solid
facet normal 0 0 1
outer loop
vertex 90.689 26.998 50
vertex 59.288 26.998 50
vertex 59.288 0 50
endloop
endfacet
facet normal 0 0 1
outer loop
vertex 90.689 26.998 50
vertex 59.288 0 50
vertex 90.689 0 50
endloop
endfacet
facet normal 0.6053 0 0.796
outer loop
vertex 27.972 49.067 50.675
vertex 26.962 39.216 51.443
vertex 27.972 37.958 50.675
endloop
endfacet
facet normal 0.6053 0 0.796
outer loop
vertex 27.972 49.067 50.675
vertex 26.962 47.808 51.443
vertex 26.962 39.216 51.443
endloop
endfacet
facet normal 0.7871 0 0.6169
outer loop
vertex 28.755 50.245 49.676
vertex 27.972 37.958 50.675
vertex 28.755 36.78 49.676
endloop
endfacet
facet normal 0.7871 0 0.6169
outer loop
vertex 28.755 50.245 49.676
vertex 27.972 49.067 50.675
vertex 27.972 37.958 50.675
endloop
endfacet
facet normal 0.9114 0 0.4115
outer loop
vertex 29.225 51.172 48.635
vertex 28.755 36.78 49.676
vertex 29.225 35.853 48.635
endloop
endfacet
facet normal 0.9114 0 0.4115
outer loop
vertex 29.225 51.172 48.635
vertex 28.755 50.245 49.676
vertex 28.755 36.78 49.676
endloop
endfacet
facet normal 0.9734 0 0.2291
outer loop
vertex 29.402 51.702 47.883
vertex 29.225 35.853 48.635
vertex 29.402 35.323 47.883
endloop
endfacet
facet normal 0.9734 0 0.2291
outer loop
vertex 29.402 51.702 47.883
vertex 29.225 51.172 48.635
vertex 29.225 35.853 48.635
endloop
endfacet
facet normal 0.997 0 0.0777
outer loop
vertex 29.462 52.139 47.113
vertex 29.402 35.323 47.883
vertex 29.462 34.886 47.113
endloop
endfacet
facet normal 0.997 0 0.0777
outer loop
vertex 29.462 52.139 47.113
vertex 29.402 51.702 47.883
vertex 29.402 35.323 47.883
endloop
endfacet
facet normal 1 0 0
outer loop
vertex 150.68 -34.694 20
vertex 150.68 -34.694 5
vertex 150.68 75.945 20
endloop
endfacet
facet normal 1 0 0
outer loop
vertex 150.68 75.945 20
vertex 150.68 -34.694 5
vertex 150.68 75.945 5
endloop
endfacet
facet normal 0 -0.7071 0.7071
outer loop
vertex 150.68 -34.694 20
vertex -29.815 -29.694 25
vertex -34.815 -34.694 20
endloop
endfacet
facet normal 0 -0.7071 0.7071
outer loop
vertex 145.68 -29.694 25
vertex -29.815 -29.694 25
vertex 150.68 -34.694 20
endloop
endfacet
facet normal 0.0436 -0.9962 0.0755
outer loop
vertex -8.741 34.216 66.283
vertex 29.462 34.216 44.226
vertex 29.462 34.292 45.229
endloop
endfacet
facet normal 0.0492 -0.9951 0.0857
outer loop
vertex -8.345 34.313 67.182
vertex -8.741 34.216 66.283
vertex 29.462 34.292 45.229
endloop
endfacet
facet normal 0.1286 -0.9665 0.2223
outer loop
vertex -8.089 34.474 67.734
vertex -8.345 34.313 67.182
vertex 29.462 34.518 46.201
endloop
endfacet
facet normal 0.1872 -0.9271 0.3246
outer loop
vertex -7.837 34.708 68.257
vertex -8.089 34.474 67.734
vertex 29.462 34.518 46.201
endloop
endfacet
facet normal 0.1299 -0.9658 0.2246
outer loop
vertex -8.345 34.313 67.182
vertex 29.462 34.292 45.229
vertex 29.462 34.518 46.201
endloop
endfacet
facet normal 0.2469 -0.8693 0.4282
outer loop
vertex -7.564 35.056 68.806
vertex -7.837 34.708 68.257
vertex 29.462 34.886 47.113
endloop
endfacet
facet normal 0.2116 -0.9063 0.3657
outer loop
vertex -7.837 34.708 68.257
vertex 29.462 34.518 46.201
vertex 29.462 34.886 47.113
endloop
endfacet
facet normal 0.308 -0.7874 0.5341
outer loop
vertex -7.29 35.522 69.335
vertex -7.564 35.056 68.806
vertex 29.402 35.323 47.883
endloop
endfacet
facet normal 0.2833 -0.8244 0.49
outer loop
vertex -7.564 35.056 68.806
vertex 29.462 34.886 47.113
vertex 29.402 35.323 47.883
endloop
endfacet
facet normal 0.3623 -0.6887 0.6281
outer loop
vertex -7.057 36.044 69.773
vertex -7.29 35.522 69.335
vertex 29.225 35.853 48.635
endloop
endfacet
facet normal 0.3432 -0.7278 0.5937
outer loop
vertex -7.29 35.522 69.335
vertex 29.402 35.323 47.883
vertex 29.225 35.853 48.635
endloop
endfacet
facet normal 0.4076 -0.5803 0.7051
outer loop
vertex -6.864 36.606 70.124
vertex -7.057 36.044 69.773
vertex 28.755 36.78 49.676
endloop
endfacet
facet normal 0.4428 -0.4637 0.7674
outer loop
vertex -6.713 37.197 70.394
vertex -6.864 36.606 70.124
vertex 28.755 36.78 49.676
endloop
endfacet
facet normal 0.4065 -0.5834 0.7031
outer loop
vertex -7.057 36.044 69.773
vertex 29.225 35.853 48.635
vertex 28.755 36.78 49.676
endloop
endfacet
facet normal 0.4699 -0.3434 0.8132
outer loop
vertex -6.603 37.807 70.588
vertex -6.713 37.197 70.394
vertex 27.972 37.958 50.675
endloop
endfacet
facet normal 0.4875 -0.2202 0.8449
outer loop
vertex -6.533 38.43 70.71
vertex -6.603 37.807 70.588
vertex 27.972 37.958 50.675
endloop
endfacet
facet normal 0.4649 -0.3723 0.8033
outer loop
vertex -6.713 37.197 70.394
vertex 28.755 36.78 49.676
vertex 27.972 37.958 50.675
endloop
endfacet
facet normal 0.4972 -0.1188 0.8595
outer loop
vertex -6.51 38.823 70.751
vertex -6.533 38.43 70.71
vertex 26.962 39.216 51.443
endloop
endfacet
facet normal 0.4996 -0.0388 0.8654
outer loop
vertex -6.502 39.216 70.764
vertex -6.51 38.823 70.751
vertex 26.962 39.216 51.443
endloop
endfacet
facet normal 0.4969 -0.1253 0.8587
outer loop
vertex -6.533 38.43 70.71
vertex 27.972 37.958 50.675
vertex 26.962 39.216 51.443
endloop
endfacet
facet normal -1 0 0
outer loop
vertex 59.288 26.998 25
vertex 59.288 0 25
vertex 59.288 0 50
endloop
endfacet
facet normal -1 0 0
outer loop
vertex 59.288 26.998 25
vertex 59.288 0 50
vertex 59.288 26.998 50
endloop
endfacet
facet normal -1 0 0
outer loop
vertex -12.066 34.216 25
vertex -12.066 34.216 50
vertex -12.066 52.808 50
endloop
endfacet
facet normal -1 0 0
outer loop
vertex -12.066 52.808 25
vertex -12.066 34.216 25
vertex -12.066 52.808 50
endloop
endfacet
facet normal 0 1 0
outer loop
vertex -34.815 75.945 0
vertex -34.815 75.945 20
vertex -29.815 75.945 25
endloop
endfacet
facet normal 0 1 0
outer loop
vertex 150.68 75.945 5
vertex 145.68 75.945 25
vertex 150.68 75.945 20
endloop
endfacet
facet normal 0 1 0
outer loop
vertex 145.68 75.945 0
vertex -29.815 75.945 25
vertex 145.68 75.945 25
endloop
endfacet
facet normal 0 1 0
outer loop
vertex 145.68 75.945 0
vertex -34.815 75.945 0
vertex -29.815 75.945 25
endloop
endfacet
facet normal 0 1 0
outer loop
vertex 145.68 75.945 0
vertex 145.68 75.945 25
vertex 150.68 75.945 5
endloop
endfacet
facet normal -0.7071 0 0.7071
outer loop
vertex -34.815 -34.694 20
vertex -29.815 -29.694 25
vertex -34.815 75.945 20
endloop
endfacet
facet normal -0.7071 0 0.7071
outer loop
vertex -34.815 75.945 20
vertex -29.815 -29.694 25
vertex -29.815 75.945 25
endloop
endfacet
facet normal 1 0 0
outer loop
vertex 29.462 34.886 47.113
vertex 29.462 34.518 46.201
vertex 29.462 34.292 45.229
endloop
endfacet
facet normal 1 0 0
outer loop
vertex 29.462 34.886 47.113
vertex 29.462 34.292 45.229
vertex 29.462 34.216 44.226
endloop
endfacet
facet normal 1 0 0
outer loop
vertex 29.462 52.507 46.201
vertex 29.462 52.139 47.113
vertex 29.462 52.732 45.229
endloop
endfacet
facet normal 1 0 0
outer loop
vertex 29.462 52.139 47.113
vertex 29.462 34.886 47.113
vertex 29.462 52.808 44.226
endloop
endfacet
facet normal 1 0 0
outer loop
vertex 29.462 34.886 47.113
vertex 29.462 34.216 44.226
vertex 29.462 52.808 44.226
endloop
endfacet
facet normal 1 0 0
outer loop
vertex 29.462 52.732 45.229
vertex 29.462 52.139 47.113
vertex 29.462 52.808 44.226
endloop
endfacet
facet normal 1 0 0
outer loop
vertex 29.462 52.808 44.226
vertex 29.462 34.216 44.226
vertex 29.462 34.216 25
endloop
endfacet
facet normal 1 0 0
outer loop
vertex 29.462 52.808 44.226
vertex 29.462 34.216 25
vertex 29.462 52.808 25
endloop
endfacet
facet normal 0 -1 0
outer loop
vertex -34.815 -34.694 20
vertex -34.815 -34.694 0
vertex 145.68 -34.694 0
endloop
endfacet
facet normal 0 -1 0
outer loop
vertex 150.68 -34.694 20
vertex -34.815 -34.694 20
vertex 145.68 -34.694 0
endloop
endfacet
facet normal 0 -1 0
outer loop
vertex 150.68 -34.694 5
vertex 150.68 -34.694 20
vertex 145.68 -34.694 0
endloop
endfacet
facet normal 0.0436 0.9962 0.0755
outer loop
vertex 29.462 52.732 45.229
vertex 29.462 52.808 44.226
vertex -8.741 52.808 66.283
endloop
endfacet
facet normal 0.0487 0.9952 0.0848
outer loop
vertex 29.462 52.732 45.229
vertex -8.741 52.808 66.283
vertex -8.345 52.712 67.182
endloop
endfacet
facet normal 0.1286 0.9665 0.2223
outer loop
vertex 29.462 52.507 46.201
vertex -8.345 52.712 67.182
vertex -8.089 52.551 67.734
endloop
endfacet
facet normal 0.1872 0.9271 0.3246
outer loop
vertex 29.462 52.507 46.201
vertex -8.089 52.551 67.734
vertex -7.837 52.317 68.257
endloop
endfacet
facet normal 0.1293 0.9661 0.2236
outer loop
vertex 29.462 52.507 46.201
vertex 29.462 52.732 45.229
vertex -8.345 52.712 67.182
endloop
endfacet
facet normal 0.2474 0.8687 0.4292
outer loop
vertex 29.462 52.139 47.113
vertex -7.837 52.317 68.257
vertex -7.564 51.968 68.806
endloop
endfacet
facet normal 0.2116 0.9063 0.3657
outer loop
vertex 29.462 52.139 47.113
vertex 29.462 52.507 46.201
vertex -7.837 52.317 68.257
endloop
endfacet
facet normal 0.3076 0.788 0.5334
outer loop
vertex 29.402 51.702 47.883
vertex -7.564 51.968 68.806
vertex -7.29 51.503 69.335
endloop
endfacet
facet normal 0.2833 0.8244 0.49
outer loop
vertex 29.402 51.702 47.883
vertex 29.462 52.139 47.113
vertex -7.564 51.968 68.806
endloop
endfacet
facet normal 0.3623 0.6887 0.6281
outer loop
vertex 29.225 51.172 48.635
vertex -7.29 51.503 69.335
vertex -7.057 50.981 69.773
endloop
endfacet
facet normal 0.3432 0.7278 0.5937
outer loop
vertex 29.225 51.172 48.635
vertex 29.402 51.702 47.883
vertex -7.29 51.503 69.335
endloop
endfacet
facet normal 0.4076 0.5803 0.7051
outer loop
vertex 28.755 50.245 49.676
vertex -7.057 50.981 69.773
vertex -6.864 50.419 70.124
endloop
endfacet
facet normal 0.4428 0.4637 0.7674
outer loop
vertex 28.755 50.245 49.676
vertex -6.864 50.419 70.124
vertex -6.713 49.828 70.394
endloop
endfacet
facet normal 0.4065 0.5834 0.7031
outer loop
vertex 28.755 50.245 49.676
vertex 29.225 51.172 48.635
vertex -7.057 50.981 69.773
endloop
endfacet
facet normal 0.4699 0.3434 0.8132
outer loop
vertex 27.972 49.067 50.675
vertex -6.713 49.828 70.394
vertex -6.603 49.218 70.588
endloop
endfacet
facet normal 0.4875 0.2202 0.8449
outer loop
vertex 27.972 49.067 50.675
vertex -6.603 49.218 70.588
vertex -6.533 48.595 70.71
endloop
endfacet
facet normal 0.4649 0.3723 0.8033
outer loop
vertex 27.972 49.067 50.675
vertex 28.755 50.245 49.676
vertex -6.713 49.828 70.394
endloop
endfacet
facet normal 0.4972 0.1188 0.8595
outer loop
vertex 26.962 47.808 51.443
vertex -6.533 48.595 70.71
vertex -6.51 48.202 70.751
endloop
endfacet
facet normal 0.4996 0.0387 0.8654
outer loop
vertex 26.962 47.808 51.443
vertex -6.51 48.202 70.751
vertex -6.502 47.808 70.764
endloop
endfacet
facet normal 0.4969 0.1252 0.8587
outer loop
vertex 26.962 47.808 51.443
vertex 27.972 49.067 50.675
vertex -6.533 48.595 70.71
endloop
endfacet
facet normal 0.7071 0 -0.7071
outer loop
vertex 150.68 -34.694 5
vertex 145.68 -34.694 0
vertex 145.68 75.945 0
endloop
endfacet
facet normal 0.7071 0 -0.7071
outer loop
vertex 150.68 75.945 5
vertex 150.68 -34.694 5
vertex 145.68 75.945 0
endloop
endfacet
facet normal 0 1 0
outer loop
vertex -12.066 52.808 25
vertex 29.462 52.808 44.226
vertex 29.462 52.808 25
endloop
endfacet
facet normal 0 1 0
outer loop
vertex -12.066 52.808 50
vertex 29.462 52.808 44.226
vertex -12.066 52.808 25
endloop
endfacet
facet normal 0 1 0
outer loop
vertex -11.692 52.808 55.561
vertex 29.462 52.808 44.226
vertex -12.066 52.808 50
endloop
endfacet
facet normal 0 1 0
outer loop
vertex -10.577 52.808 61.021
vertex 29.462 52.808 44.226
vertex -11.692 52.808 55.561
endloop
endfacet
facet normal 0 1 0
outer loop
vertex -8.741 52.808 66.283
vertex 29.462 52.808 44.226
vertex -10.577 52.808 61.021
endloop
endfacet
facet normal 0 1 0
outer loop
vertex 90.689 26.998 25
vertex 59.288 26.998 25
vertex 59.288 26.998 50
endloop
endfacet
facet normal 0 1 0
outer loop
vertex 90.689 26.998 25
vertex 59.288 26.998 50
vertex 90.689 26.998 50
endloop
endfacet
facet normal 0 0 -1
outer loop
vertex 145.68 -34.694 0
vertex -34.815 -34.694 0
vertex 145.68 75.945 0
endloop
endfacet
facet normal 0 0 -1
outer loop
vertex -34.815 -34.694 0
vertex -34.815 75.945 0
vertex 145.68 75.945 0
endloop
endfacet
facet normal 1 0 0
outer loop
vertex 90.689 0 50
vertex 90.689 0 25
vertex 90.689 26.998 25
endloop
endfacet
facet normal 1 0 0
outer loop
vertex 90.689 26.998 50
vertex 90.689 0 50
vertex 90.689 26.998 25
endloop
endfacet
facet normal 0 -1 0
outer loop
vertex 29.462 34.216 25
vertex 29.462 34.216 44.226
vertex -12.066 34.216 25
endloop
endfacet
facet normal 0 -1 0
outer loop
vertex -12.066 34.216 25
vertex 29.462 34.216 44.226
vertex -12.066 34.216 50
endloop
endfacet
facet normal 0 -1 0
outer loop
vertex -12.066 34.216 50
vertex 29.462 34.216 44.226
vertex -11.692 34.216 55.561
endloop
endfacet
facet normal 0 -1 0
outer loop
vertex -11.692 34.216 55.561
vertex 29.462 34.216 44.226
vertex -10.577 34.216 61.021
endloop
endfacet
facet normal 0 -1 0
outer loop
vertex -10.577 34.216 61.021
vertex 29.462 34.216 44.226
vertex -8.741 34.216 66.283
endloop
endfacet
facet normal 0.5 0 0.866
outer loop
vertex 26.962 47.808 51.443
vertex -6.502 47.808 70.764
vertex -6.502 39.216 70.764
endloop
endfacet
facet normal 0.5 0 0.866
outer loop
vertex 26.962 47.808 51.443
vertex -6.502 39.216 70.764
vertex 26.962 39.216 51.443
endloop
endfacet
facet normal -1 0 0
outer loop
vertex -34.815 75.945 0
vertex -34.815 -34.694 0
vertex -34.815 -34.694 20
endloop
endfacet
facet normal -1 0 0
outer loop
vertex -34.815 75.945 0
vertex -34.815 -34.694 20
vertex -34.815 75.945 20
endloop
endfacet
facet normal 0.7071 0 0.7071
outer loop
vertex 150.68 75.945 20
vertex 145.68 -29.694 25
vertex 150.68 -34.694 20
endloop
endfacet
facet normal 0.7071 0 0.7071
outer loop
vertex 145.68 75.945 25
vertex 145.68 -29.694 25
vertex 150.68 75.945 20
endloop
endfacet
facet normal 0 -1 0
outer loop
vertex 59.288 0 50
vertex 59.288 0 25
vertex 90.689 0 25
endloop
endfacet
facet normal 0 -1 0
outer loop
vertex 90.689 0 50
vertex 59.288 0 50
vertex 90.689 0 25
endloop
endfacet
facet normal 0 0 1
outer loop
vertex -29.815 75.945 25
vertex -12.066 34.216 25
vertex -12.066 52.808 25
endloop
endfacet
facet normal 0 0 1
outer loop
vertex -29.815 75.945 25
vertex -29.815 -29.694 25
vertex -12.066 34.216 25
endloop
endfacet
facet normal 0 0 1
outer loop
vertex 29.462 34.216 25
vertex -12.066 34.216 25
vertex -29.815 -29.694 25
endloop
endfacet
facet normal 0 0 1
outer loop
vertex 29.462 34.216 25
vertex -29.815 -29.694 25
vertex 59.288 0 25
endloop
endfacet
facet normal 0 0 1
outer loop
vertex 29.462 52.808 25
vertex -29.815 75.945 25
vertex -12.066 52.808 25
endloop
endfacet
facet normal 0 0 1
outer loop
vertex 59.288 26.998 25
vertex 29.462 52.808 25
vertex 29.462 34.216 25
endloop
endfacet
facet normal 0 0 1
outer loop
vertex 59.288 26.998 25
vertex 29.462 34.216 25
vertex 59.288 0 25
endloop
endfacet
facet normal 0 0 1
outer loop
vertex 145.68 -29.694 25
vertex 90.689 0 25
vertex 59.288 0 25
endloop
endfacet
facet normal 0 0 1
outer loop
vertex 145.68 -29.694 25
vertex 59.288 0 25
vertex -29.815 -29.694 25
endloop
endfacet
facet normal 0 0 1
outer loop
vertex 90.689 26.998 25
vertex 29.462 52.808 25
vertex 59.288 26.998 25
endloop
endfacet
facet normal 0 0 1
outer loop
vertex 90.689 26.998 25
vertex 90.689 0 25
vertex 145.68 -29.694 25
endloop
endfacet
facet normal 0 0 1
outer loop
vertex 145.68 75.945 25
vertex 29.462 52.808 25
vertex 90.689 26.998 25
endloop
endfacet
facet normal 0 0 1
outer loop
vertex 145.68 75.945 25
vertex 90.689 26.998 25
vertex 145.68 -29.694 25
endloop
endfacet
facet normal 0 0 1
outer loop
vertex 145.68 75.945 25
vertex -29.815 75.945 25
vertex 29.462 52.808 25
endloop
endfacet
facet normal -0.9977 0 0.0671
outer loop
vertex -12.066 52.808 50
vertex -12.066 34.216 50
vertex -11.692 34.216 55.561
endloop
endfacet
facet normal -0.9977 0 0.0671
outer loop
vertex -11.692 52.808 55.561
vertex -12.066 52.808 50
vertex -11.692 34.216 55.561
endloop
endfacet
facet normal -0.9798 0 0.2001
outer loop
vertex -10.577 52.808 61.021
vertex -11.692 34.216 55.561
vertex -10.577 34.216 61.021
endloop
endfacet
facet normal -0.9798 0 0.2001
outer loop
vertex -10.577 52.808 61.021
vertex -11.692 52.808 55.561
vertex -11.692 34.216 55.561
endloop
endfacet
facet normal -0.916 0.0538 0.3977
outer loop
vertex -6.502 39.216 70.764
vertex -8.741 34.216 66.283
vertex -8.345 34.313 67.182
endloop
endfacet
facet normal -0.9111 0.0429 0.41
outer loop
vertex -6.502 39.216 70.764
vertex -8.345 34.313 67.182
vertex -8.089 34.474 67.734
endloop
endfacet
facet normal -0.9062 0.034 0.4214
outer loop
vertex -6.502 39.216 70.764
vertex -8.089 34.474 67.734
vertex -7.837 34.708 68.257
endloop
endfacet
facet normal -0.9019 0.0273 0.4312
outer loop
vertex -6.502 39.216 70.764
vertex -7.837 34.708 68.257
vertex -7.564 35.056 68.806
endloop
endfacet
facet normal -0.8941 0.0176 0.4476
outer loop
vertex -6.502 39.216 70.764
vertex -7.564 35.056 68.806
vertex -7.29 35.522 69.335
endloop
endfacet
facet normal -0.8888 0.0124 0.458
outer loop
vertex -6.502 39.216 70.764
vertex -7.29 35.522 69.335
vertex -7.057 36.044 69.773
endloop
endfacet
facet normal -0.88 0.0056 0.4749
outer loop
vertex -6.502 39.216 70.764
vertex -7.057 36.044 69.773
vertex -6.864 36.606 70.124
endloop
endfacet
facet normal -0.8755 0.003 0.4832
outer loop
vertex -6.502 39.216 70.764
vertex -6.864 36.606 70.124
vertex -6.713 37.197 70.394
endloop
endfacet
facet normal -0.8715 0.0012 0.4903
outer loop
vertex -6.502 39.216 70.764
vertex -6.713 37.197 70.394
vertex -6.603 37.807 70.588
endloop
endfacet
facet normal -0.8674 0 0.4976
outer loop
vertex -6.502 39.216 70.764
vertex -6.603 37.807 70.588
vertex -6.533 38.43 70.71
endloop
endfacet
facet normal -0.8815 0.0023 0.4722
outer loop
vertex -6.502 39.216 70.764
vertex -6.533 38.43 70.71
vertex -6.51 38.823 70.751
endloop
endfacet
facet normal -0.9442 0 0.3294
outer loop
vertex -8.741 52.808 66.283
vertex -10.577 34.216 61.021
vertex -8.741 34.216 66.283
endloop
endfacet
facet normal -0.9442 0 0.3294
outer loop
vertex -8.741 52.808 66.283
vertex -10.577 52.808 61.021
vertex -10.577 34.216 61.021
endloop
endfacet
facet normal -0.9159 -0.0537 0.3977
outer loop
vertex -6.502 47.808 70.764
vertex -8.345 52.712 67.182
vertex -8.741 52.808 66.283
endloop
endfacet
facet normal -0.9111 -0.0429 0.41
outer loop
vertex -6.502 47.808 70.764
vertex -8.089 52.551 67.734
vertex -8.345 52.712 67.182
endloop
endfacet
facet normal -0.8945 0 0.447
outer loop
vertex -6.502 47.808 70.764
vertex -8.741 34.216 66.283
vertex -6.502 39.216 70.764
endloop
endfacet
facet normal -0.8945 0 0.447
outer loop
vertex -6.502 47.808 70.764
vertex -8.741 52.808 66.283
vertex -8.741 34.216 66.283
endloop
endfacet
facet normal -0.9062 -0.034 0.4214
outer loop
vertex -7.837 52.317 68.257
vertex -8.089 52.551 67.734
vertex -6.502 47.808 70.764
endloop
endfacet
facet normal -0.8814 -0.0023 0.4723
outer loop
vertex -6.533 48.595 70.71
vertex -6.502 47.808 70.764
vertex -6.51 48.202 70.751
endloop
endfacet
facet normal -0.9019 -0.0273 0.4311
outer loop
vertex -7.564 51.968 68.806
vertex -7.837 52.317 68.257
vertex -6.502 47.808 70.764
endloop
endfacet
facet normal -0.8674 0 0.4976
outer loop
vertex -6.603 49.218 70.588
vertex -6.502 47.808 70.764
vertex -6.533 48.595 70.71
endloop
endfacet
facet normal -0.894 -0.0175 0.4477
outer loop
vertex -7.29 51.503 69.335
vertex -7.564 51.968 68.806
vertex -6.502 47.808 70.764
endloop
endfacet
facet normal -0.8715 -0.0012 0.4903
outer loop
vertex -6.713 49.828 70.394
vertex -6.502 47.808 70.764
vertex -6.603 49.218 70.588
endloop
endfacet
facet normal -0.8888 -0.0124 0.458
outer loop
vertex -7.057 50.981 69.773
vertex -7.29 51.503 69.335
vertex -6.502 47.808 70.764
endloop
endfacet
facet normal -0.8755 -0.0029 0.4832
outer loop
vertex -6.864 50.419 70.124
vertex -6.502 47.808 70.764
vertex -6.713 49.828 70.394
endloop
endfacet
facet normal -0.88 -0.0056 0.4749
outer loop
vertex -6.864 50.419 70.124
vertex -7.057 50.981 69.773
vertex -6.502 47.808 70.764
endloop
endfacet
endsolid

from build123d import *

# Parameters (mm, degrees)
F0_W      = 185.4944750667
F0_H      = 110.638756305
F1_DEPTH  = 25
F2_SIZE   = 5
F3_W      = 31.4006619155
F3_H      = 26.9978269935
F3_W_2    = 41.5280163288
F3_H_2    = 18.5919255018
F4_DEPTH  = 25
F4_FACE_W = 41.5280163288
F4_FACE_H = 18.5919255018
F5_ANGLE  = 30
F6_R      = 5


with BuildPart() as f1:
    # F0 (on Top) → F1 (new body)
    with BuildSketch(Plane.XY):
        with Locations((57.9323507845, 20.6255745143)):
            Rectangle(F0_W, F0_H)
    extrude(amount=F1_DEPTH)

    # F2
    f2_edges = [f1.edges().sort_by_distance(p)[0] for p in [
        (57.932351, -34.693804, 25),
        (-34.814887, 20.625575, 25),
        (150.679588, 20.625575, 25),
        (150.679588, 20.625575, 0),
    ]]
    chamfer(f2_edges, length=F2_SIZE)

    # F3 (on face) → F4 (join)
    with BuildSketch(Plane.XY.offset(25)):
        with Locations((74.988739565, 13.4989134967)):
            Rectangle(F3_W, F3_H)
        with Locations((8.6979772896, 43.5124337673)):
            Rectangle(F3_W_2, F3_H_2)
    extrude(amount=F4_DEPTH)

    # F4_face (on face) → F5 (revolve)
    with BuildSketch(Plane(origin=(8.6979772896, 43.5124337673, 50), x_dir=(1, 0, 0), z_dir=(0, 0, 1))):
        Rectangle(F4_FACE_W, F4_FACE_H)
    revolve(axis=Axis((29.461985454, 43.5124337673, 50), (0, 1, 0)), revolution_arc=F5_ANGLE)

    # F6
    f6_edges = [f1.edges().sort_by_distance(p)[0] for p in [
        (11.479827, 34.216471, 60.382004),
        (11.479827, 52.808397, 60.382004),
        (29.461985, 43.512434, 50),
    ]]
    fillet(f6_edges, radius=F6_R)


solid = f1.part
